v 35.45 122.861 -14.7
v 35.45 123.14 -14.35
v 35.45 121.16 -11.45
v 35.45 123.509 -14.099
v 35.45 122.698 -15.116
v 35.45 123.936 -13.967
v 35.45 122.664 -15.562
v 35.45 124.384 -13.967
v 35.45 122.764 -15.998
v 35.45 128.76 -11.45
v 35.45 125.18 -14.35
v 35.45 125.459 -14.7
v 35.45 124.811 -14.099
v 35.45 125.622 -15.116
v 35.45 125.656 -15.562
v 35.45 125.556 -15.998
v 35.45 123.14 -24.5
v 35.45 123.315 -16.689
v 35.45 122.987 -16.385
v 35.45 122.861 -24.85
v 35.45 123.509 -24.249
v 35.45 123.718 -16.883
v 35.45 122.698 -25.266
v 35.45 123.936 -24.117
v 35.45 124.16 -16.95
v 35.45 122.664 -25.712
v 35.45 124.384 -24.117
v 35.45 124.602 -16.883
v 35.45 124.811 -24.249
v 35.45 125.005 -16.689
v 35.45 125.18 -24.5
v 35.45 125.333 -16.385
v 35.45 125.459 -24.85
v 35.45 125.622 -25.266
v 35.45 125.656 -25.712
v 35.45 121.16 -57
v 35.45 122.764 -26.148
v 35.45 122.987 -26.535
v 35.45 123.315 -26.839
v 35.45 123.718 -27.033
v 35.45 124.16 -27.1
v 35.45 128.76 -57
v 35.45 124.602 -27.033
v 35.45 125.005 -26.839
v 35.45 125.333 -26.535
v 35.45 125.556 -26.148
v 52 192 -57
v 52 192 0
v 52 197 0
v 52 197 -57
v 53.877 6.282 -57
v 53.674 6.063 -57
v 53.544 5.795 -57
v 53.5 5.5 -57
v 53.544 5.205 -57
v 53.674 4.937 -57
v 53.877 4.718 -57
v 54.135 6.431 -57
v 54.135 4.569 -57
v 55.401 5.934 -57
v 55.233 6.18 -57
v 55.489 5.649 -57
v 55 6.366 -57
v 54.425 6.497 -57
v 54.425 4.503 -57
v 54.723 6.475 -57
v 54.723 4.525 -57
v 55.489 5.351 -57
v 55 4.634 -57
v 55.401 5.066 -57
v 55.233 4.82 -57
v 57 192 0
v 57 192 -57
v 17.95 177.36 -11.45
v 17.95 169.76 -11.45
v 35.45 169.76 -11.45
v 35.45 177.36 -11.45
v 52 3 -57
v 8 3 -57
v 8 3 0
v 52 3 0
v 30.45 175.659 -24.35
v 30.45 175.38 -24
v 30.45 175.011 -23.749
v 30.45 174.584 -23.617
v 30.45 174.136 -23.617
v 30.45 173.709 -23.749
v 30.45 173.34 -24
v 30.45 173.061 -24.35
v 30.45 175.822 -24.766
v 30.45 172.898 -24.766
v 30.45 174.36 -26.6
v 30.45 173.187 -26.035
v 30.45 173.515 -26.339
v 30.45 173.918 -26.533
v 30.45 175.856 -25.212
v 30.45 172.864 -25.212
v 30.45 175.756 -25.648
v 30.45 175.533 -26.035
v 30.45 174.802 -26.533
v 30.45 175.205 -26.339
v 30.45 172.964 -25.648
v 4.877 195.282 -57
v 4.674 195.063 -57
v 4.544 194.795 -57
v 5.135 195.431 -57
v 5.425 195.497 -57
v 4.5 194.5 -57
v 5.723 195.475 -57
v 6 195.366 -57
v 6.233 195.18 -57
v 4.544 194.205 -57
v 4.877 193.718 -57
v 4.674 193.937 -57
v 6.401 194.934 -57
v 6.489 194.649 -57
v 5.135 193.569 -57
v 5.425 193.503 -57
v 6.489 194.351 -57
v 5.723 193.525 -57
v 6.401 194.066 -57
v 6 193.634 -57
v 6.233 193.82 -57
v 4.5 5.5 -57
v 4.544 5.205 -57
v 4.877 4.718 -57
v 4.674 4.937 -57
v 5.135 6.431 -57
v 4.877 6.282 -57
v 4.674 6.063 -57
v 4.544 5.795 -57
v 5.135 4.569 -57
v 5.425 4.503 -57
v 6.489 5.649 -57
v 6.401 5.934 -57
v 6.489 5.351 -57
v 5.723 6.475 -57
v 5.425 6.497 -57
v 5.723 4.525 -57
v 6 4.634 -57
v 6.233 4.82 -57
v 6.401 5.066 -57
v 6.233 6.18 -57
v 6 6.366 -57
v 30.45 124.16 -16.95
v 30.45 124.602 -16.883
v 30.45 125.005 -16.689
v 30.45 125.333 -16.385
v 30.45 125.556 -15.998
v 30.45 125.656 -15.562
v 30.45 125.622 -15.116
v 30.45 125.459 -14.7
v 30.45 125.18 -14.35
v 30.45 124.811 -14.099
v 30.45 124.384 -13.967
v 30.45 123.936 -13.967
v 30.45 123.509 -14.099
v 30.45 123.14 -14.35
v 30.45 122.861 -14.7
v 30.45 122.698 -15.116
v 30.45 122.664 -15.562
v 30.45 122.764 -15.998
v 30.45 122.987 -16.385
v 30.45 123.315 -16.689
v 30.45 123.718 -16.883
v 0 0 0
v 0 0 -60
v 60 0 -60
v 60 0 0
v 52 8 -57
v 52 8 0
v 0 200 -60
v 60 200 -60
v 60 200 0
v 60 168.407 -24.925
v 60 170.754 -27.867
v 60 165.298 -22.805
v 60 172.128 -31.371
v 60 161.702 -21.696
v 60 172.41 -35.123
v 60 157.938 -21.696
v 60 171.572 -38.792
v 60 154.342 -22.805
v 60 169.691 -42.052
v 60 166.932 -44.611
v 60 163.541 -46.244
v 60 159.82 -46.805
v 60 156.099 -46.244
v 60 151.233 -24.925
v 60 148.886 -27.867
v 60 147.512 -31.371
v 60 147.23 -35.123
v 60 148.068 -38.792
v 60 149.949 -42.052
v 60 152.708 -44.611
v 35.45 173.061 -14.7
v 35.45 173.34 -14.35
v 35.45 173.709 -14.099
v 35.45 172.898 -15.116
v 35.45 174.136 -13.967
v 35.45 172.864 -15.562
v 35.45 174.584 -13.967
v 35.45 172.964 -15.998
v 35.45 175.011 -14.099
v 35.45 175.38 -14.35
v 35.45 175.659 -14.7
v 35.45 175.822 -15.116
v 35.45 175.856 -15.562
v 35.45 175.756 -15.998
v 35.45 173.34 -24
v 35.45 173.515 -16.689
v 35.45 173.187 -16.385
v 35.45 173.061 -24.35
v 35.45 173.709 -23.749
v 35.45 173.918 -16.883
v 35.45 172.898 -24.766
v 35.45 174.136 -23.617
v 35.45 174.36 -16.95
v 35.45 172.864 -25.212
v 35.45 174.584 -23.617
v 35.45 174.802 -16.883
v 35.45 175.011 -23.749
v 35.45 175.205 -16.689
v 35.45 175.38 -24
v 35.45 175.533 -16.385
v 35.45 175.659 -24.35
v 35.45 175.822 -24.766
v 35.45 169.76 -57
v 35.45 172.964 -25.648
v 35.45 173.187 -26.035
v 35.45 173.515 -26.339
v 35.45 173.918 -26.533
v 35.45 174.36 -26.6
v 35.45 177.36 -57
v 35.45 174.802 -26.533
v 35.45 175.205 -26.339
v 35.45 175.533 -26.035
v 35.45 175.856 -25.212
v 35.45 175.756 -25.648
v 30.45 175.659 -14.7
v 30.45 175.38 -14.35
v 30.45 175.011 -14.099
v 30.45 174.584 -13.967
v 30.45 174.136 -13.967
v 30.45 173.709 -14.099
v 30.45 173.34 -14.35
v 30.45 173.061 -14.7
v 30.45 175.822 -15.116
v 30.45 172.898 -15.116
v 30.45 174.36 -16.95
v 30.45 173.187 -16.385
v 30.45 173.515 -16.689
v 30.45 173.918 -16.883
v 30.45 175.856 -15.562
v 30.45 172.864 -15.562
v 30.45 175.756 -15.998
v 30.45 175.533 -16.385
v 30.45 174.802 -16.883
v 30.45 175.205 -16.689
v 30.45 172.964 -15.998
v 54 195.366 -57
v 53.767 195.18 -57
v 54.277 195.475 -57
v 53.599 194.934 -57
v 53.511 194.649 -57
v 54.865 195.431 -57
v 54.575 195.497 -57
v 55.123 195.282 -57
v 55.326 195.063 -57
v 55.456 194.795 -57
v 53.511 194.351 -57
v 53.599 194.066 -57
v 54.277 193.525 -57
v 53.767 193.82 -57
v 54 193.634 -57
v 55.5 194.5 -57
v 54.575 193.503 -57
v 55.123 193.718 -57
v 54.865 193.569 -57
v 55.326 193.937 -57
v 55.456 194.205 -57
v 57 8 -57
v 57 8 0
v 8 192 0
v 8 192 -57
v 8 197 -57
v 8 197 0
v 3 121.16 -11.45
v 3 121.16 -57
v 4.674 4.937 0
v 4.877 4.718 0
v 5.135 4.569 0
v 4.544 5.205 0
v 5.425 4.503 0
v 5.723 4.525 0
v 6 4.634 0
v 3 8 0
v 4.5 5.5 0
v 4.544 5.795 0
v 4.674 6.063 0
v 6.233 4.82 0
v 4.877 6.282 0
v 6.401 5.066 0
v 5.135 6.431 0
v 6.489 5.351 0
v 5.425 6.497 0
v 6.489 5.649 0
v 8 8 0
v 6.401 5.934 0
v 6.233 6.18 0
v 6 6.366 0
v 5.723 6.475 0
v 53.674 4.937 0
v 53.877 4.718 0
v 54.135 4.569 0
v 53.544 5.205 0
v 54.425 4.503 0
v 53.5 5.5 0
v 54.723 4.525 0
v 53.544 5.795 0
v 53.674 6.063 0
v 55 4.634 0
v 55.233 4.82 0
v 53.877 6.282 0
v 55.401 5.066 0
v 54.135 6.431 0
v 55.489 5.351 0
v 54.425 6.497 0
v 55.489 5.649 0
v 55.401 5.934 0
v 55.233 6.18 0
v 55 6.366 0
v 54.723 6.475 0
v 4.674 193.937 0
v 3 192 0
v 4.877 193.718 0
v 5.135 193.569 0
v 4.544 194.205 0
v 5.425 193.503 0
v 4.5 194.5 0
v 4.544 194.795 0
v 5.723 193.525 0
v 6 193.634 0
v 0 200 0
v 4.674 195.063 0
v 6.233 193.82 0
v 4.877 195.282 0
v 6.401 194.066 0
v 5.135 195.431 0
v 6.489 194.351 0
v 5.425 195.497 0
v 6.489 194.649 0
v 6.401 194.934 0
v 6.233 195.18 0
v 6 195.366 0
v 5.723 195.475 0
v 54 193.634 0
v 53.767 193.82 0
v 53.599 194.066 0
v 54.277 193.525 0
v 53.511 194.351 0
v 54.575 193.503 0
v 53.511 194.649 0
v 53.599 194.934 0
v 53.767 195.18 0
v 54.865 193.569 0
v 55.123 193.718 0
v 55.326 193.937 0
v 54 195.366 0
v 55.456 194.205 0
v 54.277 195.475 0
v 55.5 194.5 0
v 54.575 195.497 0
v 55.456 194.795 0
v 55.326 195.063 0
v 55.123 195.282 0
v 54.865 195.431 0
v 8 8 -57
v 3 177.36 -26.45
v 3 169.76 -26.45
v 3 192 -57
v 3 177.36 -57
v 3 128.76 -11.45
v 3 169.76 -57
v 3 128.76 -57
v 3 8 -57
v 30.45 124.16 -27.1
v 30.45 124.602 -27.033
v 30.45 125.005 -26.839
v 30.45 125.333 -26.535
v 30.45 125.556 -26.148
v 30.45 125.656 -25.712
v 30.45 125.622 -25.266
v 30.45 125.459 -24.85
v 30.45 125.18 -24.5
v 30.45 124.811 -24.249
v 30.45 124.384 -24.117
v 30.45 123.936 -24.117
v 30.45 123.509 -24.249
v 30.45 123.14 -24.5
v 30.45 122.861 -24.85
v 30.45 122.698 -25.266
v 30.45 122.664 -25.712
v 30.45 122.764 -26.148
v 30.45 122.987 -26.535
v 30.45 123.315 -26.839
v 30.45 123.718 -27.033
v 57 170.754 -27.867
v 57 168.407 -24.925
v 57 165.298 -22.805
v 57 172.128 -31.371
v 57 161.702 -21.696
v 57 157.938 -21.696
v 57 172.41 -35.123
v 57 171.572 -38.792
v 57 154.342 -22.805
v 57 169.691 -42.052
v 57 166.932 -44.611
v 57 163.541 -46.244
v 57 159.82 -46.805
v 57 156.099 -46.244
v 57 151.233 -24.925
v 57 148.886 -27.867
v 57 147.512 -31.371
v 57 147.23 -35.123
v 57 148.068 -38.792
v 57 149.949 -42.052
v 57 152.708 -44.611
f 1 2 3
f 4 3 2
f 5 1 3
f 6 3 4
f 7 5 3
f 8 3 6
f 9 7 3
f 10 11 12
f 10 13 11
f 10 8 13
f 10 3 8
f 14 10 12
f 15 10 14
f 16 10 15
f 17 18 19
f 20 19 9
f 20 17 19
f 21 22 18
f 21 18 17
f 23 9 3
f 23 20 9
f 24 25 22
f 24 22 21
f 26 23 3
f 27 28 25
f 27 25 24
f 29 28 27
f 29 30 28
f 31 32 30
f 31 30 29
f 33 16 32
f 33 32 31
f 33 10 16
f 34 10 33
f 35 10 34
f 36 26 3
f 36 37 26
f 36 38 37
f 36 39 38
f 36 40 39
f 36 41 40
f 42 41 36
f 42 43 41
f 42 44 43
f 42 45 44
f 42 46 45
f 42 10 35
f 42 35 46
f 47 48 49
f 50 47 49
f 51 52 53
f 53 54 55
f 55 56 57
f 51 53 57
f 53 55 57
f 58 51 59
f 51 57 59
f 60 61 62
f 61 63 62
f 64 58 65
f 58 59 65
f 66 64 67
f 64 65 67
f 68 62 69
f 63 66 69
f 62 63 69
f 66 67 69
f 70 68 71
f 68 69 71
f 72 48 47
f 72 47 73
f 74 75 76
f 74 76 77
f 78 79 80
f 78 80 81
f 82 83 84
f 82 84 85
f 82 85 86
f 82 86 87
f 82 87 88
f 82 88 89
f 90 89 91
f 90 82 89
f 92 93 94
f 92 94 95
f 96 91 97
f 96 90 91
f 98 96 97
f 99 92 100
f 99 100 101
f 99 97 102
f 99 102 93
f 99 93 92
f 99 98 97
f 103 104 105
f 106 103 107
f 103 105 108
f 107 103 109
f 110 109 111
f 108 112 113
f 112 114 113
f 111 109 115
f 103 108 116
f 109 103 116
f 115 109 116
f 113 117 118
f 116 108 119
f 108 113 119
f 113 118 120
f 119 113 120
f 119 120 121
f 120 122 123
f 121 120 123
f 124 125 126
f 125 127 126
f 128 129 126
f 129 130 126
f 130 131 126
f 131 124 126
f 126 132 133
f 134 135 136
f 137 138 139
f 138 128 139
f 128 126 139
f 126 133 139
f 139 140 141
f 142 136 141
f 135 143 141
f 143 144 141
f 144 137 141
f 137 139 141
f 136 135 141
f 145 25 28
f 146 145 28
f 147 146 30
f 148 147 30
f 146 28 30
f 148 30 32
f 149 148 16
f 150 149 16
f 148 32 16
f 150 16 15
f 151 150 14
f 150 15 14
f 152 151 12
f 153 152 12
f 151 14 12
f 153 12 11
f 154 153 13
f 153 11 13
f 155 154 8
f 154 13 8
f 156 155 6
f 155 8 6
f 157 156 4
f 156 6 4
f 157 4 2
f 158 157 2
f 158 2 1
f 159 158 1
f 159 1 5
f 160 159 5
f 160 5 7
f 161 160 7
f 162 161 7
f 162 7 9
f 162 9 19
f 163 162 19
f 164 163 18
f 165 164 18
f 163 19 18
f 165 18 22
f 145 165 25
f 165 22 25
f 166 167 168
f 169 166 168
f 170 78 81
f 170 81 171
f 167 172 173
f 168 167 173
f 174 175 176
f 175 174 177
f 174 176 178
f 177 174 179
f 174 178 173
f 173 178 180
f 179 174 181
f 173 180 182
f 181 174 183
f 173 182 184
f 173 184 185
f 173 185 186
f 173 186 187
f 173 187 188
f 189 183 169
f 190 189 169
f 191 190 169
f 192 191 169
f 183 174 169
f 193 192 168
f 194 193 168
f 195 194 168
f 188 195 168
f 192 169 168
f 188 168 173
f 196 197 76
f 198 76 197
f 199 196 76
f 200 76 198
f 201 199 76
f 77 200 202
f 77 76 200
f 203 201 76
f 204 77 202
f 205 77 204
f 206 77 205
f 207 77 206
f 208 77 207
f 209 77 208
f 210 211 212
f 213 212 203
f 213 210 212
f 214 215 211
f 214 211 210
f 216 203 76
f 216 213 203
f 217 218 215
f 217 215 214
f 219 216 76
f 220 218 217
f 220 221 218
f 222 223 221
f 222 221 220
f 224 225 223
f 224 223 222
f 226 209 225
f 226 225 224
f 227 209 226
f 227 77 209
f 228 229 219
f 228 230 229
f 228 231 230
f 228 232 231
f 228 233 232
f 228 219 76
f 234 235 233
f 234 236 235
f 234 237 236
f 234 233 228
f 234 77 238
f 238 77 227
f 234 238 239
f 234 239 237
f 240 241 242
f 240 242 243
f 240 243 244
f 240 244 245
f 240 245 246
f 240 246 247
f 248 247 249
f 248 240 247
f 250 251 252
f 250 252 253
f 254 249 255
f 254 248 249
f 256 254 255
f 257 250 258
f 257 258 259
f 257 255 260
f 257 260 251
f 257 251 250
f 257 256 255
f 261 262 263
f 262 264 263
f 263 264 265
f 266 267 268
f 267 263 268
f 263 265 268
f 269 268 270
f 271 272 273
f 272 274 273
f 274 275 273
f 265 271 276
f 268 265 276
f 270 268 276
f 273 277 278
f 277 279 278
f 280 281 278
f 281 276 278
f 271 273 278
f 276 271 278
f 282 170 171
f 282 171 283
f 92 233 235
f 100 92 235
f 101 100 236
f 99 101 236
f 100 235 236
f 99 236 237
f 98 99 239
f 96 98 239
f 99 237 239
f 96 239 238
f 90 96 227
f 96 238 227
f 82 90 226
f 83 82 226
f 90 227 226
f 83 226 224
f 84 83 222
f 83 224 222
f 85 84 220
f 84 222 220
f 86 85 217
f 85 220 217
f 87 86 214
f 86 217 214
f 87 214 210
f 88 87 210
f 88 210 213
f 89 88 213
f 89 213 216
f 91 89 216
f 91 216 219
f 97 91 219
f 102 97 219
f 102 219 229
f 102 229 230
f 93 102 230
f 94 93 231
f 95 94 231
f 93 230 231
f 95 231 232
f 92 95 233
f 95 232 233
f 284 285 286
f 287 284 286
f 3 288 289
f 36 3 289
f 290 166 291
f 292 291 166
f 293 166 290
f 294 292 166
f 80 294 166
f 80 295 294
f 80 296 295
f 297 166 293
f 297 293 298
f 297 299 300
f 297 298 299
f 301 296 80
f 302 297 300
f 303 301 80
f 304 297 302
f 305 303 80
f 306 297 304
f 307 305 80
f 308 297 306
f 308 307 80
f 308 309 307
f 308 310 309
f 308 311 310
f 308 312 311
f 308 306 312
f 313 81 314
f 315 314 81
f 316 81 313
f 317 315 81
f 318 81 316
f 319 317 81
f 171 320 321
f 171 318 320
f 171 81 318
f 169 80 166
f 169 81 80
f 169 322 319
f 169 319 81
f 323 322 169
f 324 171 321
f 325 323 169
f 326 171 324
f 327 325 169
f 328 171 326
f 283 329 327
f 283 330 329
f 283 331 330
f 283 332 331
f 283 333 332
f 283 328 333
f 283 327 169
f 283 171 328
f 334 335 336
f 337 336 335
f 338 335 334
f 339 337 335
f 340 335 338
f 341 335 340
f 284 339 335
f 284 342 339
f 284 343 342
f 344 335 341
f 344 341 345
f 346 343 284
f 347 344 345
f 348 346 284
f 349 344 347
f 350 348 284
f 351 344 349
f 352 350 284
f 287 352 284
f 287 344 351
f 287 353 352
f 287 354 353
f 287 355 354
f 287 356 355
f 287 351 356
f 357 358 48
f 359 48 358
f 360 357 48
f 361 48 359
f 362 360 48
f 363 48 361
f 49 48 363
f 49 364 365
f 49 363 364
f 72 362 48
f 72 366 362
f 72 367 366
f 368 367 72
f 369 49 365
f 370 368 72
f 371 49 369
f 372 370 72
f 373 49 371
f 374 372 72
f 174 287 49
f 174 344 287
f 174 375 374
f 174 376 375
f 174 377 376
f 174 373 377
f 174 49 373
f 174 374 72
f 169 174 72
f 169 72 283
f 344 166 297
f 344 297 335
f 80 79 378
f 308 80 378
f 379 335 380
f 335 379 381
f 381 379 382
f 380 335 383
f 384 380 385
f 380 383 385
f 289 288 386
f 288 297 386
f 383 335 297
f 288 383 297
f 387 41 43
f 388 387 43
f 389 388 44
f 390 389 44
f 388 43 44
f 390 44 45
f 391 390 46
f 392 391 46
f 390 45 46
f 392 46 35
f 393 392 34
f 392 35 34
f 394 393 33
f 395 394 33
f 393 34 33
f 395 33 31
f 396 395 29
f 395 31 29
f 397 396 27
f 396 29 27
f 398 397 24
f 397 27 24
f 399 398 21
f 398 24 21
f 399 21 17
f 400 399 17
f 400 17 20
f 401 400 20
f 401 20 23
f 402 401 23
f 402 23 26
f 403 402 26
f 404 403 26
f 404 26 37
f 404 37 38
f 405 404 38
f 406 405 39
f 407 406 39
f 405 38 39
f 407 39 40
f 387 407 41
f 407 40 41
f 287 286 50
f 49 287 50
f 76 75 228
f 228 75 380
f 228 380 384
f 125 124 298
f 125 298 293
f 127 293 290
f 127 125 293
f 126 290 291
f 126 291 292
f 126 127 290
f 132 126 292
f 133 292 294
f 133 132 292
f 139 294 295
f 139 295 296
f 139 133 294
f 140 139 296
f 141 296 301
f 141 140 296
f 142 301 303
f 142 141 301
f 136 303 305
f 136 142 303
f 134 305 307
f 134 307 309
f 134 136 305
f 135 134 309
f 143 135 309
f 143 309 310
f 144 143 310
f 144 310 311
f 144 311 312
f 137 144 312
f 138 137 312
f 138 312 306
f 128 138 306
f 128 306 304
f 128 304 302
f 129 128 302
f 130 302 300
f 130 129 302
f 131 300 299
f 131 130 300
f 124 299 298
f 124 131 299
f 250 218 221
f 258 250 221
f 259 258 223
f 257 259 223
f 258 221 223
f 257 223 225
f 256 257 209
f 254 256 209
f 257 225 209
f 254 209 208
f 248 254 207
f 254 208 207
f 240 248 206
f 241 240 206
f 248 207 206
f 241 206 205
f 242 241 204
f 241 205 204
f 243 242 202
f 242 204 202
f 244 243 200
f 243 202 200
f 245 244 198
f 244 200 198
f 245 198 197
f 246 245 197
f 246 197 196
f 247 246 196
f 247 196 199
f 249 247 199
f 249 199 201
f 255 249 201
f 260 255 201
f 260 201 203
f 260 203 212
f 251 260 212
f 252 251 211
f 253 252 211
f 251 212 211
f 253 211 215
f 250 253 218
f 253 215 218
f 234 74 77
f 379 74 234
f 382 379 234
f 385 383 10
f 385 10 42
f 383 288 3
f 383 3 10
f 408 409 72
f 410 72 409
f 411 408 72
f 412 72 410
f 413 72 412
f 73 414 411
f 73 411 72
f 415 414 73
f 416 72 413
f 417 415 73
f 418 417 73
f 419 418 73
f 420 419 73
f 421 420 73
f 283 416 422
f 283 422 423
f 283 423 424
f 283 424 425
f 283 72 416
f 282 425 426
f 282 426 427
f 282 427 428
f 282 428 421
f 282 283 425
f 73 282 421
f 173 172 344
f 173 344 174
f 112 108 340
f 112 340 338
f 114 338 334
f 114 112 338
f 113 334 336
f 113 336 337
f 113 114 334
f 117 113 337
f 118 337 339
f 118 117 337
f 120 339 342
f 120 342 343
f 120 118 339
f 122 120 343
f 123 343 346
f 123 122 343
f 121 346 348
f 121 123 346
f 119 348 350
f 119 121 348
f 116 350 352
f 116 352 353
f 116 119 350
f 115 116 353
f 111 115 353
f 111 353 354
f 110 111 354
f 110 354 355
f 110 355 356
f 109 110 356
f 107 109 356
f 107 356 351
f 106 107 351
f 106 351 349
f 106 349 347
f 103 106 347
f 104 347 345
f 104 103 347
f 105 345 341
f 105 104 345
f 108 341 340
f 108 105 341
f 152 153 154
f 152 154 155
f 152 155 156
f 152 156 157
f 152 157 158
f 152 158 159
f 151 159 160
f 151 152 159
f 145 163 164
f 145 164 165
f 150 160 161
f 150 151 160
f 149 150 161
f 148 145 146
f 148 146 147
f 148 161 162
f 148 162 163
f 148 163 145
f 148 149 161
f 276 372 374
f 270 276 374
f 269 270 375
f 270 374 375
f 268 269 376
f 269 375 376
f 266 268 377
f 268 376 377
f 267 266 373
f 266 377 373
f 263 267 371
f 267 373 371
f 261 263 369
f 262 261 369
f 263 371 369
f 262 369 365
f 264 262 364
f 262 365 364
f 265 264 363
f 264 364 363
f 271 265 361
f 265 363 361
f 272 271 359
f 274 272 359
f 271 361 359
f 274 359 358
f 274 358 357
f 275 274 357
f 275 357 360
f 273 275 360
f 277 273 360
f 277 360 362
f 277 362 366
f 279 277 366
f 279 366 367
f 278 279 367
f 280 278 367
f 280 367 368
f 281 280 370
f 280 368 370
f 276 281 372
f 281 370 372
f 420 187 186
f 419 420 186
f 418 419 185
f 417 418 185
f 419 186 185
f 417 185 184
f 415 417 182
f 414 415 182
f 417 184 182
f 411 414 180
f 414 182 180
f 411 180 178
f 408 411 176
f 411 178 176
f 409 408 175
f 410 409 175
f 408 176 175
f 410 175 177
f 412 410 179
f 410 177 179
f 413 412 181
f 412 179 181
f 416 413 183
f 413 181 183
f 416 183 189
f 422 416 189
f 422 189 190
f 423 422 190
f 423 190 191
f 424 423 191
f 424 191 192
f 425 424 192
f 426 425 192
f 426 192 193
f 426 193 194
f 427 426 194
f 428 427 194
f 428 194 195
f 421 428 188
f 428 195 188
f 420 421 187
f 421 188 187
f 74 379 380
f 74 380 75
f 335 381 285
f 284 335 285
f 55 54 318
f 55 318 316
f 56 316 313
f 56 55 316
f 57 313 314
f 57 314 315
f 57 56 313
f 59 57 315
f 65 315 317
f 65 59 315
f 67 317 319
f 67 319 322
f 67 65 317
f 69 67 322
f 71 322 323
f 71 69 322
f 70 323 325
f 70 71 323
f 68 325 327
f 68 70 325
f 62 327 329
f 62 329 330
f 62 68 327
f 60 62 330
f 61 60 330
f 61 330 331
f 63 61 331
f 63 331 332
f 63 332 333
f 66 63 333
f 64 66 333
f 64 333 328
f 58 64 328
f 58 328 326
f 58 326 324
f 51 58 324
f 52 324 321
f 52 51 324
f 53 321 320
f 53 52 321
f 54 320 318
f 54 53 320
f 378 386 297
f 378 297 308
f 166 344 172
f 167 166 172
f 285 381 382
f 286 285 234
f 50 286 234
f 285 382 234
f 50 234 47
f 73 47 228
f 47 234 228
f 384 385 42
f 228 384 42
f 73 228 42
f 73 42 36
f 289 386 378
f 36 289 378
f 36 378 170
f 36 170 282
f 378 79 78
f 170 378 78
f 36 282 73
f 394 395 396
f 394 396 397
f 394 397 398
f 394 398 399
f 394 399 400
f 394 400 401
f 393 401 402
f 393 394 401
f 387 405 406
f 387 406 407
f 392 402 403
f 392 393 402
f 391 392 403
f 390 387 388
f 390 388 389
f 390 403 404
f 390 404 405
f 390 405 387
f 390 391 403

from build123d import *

# Parameters (mm, degrees)
SZKIC1_W                    = 60
SZKIC1_H                    = 60
DODANIE_WYCI_GNI_CIE1_DEPTH = 200
SKORUPA1_T                  = -3
SZKIC2_W                    = 5
SZKIC2_H                    = 5
SZKIC2_R                    = 1
DODANIE_WYCI_GNI_CIE2_DEPTH = 57
SZKIC4_W                    = 5
SZKIC4_H                    = 5
SZKIC4_R                    = 1
DODANIE_WYCI_GNI_CIE3_DEPTH = 57
SZKIC5_W                    = 5
SZKIC5_H                    = 5
SZKIC5_R                    = 1
DODANIE_WYCI_GNI_CIE4_DEPTH = 57
SZKIC6_W                    = 5
SZKIC6_H                    = 5
SZKIC6_R                    = 1
DODANIE_WYCI_GNI_CIE6_DEPTH = 57
SZKIC9_R                    = 12.625
WYTNIJ_WYCI_GNI_CIE1_DEPTH  = 3
SZKIC10_W                   = 45.55
SZKIC10_H                   = 7.6
DODANIE_WYCI_GNI_CIE7_DEPTH = 32.45
SZKIC13_R                   = 1.5
WYTNIJ_WYCI_GNI_CIE4_DEPTH  = 5
SZKIC14_R                   = 1.5
WYTNIJ_WYCI_GNI_CIE5_DEPTH  = 5
WYTNIJ_WYCI_GNI_CIE7_DEPTH  = 10


with BuildPart() as part:
    # Szkic1 → Dodanie-wyciągnięcie1 (new body)
    with BuildSketch(Plane(origin=(0, 0, 0), x_dir=(1, 0, 0), z_dir=(0, 1, 0))):
        with Locations((30, 30)):
            Rectangle(SZKIC1_W, SZKIC1_H)
    extrude(amount=DODANIE_WYCI_GNI_CIE1_DEPTH)

    # Skorupa1
    skorupa1_openings = [part.faces().sort_by_distance(p)[0] for p in [
        (30, 100, 0),
    ]]
    offset(amount=SKORUPA1_T, openings=skorupa1_openings, kind=Kind.INTERSECTION)

    # Szkic2 → Dodanie-wyciągnięcie2 (add)
    with BuildSketch(Plane.XY.offset(-57)):
        with Locations((5.5, 194.5)):
            Rectangle(SZKIC2_W, SZKIC2_H)
        with Locations(Location((5.5, 194.5, 0), (0, 0, 180))):
            Circle(SZKIC2_R, mode=Mode.SUBTRACT)
    extrude(amount=DODANIE_WYCI_GNI_CIE2_DEPTH)

    # Szkic4 → Dodanie-wyciągnięcie3 (add)
    with BuildSketch(Plane.XY):
        with Locations((54.5, 194.5)):
            Rectangle(SZKIC4_W, SZKIC4_H)
        with Locations((54.5, 194.5)):
            Circle(SZKIC4_R, mode=Mode.SUBTRACT)
    extrude(amount=-DODANIE_WYCI_GNI_CIE3_DEPTH)

    # Szkic5 → Dodanie-wyciągnięcie4 (add)
    with BuildSketch(Plane.XY.offset(-57)):
        with Locations((5.5, 5.5)):
            Rectangle(SZKIC5_W, SZKIC5_H)
        with Locations(Location((5.5, 5.5, 0), (0, 0, 180))):
            Circle(SZKIC5_R, mode=Mode.SUBTRACT)
    extrude(amount=DODANIE_WYCI_GNI_CIE4_DEPTH)

    # Szkic6 → Dodanie-wyciągnięcie6 (add)
    with BuildSketch(Plane.XY.offset(-57)):
        with Locations((54.5, 5.5)):
            Rectangle(SZKIC6_W, SZKIC6_H)
        with Locations(Location((54.5, 5.5, 0), (0, 0, 180))):
            Circle(SZKIC6_R, mode=Mode.SUBTRACT)
    extrude(amount=DODANIE_WYCI_GNI_CIE6_DEPTH)

    # Szkic9 → Wytnij-wyciągnięcie1 (cut)
    with BuildSketch(Plane(origin=(60, 0, 0), x_dir=(0, 0, -1), z_dir=(1, 0, 0))):
        with Locations((34.18, 159.82)):
            Circle(SZKIC9_R)
    extrude(amount=-WYTNIJ_WYCI_GNI_CIE1_DEPTH, mode=Mode.SUBTRACT)

    # Szkic10 → Dodanie-wyciągnięcie7 (add)
    with BuildSketch(Plane(origin=(3, 0, 0), x_dir=(0, 0, -1), z_dir=(1, 0, 0))):
        with Locations((34.225, 173.56)):
            Rectangle(SZKIC10_W, SZKIC10_H)
        with Locations((34.225, 124.96)):
            Rectangle(SZKIC10_W, SZKIC10_H)
    extrude(amount=DODANIE_WYCI_GNI_CIE7_DEPTH)

    # Szkic13 → Wytnij-wyciągnięcie4 (cut)
    with BuildSketch(Plane(origin=(35.45, 0, 0), x_dir=(0, 0, -1), z_dir=(1, 0, 0))):
        with Locations((25.1, 174.36)):
            Circle(SZKIC13_R)
        with Locations((15.45, 174.36)):
            Circle(SZKIC13_R)
    extrude(amount=-WYTNIJ_WYCI_GNI_CIE4_DEPTH, mode=Mode.SUBTRACT)

    # Szkic14 → Wytnij-wyciągnięcie5 (cut)
    with BuildSketch(Plane(origin=(35.45, 0, 0), x_dir=(0, 0, -1), z_dir=(1, 0, 0))):
        with Locations((25.6, 124.16)):
            Circle(SZKIC14_R)
        with Locations((15.45, 124.16)):
            Circle(SZKIC14_R)
    extrude(amount=-WYTNIJ_WYCI_GNI_CIE5_DEPTH, mode=Mode.SUBTRACT)

    # Szkic15 → Wytnij-wyciągnięcie7 (cut)
    with BuildSketch(Plane(origin=(0, 177.36, 0), x_dir=(1, 0, 0), z_dir=(0, 1, 0))):
        Polygon((17.95, 11.45), (3, 11.45), (3, 26.45), align=None)
    extrude(amount=-WYTNIJ_WYCI_GNI_CIE7_DEPTH, mode=Mode.SUBTRACT)


solid = part.part
